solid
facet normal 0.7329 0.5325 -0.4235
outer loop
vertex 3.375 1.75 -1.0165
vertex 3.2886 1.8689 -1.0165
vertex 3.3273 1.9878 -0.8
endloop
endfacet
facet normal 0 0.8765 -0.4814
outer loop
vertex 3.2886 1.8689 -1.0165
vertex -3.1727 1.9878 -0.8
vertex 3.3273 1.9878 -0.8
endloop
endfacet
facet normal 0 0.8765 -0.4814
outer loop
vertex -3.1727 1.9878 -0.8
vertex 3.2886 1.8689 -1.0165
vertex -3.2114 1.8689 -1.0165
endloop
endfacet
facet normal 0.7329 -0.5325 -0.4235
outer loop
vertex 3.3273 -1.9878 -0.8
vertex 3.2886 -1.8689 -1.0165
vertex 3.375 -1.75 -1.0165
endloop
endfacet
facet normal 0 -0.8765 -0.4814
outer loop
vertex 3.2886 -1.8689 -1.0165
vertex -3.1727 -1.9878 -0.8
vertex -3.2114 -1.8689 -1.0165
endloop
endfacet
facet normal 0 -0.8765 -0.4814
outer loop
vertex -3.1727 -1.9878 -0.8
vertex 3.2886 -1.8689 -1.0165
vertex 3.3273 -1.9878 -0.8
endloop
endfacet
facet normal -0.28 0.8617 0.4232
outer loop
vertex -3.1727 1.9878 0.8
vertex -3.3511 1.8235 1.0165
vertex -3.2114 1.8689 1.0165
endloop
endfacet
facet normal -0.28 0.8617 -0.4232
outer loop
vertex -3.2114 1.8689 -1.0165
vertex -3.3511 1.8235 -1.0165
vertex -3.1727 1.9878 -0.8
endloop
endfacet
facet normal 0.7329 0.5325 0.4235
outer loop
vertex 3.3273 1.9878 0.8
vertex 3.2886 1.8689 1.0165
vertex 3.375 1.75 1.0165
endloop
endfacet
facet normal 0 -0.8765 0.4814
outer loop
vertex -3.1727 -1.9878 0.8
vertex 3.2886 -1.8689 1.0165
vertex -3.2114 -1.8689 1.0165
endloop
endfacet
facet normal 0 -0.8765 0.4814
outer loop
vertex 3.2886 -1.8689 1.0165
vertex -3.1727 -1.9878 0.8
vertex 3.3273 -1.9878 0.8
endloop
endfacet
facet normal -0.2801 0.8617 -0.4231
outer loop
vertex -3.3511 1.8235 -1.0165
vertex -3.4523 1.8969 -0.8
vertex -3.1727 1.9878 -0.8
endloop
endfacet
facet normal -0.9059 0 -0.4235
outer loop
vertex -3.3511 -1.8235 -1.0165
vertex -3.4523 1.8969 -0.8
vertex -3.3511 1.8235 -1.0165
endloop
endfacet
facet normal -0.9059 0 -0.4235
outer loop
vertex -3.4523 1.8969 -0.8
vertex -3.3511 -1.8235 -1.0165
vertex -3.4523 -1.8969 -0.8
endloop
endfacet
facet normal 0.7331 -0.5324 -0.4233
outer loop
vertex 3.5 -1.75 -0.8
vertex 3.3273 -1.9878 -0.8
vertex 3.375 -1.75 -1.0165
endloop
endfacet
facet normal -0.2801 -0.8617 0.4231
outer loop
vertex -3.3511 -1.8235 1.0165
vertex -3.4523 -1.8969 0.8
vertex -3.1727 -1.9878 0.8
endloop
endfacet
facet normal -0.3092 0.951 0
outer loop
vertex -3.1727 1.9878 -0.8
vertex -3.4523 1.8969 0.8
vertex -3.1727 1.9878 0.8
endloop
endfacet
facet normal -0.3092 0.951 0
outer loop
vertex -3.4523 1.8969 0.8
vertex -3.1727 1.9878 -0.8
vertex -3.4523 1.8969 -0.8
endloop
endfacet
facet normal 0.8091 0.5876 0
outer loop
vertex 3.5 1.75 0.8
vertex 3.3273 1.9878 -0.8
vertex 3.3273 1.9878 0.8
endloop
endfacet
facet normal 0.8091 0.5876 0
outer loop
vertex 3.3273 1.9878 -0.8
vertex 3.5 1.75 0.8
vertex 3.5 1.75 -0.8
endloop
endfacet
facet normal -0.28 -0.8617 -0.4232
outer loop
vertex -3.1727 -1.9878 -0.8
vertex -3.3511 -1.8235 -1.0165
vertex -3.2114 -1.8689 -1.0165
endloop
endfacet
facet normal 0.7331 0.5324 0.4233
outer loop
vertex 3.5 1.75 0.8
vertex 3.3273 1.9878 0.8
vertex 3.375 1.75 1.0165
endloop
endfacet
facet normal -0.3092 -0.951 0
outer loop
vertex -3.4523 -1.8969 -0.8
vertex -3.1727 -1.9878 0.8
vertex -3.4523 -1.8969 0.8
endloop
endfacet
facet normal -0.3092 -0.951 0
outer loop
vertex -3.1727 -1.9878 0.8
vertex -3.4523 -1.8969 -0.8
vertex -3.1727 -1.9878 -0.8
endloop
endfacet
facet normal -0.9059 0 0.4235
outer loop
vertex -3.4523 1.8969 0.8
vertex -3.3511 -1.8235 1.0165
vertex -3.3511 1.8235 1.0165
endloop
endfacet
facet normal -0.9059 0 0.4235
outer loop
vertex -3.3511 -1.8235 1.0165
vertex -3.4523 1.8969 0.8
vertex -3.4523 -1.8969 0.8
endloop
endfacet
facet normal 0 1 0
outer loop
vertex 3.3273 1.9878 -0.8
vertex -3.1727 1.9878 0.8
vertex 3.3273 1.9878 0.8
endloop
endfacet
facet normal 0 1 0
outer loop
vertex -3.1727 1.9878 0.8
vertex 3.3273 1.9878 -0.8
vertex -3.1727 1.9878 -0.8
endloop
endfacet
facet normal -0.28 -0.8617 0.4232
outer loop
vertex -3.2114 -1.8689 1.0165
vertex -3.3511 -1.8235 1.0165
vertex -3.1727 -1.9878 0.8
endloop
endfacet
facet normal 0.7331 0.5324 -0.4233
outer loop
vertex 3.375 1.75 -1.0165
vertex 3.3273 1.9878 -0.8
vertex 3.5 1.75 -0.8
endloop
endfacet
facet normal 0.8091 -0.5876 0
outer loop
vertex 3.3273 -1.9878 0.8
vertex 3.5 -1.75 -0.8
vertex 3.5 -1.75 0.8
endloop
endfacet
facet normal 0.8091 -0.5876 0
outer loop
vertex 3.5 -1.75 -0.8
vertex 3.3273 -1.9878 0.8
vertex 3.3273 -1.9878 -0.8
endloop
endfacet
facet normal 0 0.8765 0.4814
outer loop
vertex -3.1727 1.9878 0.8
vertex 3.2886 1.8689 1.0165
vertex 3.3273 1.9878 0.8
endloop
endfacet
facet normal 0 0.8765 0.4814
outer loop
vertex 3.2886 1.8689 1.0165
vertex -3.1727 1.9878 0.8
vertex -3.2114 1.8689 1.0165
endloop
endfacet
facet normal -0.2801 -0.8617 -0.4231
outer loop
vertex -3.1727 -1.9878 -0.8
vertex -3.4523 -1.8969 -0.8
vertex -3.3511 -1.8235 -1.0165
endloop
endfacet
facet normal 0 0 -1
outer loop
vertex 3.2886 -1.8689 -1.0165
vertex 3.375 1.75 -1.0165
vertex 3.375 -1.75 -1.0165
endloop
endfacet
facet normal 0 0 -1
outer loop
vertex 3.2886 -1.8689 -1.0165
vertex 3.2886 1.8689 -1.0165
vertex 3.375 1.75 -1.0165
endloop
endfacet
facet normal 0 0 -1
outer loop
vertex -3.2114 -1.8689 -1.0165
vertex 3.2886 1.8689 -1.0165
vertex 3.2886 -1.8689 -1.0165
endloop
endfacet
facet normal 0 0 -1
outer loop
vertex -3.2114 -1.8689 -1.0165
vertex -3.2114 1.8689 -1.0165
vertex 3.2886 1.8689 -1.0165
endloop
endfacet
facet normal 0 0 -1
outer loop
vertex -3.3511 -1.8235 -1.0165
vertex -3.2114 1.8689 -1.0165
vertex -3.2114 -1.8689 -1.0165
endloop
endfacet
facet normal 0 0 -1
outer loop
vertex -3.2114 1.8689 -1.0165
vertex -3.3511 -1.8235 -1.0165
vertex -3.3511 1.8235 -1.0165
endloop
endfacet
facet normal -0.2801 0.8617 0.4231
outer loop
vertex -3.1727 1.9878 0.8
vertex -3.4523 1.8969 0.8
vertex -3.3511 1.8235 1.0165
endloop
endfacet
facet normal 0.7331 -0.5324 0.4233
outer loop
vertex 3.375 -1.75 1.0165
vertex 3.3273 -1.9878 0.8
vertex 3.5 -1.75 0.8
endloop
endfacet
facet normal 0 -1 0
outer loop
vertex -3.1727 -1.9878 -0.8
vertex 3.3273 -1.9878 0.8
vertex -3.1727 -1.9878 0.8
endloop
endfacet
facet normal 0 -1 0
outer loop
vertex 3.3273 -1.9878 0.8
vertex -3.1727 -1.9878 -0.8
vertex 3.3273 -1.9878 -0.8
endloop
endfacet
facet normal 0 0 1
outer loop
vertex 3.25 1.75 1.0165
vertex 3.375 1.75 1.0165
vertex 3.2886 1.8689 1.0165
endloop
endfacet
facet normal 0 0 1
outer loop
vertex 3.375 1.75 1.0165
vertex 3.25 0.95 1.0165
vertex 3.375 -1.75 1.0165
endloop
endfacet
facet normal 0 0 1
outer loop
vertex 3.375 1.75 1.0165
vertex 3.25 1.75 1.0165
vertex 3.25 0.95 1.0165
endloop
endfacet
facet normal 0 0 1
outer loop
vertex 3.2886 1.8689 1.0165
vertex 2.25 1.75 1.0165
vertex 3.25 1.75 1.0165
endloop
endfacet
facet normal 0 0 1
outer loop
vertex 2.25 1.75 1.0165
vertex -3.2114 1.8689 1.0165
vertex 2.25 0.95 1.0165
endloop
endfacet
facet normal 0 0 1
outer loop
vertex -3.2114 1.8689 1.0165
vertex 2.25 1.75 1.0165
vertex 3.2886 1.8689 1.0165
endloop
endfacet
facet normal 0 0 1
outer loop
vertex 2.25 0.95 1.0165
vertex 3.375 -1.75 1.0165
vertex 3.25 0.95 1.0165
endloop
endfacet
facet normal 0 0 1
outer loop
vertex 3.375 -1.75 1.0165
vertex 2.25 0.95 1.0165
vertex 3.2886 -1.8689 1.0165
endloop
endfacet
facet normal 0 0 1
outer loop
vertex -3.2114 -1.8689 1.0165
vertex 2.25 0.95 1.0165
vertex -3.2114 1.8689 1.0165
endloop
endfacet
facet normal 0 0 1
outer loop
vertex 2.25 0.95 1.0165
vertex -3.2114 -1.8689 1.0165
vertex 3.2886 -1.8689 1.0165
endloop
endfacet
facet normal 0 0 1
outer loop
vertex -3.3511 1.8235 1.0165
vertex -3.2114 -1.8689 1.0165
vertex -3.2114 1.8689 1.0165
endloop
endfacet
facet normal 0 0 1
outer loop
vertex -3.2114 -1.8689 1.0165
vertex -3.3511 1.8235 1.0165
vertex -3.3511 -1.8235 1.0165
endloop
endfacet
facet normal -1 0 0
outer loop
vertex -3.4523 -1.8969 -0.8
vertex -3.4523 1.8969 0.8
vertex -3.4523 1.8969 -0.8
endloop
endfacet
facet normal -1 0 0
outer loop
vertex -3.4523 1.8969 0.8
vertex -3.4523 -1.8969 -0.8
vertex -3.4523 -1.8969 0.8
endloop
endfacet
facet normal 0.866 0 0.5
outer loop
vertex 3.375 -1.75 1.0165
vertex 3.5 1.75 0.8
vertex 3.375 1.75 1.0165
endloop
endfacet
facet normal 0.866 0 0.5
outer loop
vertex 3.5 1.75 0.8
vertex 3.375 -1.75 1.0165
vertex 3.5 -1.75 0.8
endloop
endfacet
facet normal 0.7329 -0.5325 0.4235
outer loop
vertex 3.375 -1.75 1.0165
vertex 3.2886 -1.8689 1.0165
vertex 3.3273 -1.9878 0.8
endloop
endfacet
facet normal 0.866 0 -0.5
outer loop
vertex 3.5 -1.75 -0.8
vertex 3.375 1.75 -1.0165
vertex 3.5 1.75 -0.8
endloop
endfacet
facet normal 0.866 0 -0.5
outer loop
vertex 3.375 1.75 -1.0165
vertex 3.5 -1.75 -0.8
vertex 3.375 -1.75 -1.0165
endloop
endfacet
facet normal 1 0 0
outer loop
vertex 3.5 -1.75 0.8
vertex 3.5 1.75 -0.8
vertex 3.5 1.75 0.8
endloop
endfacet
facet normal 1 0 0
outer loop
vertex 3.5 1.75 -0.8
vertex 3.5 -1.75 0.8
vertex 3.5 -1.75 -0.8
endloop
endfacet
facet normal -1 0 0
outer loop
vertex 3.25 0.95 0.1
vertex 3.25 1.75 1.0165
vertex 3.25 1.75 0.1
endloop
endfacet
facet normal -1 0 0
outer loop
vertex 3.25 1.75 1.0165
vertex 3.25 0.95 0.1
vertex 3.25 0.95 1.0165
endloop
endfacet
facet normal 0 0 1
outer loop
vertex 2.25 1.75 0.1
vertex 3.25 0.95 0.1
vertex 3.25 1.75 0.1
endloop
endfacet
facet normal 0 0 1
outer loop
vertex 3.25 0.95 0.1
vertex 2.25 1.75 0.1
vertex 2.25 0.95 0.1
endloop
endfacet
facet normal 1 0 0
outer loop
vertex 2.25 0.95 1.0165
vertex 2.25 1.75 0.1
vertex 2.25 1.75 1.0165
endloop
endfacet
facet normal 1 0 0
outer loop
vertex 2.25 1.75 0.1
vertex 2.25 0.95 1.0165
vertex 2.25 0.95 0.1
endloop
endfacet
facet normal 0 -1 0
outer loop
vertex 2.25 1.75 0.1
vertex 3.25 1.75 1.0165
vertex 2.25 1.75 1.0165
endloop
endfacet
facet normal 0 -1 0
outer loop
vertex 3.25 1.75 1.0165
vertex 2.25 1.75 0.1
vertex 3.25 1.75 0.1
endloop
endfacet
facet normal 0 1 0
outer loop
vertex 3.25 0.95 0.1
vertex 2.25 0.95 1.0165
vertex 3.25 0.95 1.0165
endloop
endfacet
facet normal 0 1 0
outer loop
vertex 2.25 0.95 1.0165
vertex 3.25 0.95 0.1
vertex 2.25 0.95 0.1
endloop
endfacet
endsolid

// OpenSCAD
// Parameters
body_length = 6.5; //[3.25:13:0.1]
body_width = 3.5; //[1.75:7:0.1]
body_height = 1.6; //[0.8:3.2:0.05]
notch_length = 1.0; //[0.5:2.0:0.05]
notch_width = 0.8; //[0.4:1.6:0.05]
notch_depth = 0.3; //[0.1:0.8:0.05]
chamfer_size = 0.25; //[0.1:0.6:0.05]
overlap = 0.8; //[0.2:2.0:0.1]

// Base shapes
module smd_body() {
  cube([body_length, body_width, body_height], center=true);
}

module marking_notch() {
  translate([body_length/2 - notch_length/2, body_width/2 - notch_width/2, body_height/2 - notch_depth/2])
    cube([notch_length, notch_width, notch_depth + overlap], center=true);
}

module edge_chamfers() {
  sphere(r=chamfer_size);
}

// Operations
module body_with_chamfers() {
  minkowski() {
    smd_body();
    edge_chamfers();
  }
}

module final_smd_model() {
  difference() {
    body_with_chamfers();
    marking_notch();
  }
}

// Final output
color([0.85, 0.85, 0.8]) // Off-white color for SMD package
final_smd_model();
